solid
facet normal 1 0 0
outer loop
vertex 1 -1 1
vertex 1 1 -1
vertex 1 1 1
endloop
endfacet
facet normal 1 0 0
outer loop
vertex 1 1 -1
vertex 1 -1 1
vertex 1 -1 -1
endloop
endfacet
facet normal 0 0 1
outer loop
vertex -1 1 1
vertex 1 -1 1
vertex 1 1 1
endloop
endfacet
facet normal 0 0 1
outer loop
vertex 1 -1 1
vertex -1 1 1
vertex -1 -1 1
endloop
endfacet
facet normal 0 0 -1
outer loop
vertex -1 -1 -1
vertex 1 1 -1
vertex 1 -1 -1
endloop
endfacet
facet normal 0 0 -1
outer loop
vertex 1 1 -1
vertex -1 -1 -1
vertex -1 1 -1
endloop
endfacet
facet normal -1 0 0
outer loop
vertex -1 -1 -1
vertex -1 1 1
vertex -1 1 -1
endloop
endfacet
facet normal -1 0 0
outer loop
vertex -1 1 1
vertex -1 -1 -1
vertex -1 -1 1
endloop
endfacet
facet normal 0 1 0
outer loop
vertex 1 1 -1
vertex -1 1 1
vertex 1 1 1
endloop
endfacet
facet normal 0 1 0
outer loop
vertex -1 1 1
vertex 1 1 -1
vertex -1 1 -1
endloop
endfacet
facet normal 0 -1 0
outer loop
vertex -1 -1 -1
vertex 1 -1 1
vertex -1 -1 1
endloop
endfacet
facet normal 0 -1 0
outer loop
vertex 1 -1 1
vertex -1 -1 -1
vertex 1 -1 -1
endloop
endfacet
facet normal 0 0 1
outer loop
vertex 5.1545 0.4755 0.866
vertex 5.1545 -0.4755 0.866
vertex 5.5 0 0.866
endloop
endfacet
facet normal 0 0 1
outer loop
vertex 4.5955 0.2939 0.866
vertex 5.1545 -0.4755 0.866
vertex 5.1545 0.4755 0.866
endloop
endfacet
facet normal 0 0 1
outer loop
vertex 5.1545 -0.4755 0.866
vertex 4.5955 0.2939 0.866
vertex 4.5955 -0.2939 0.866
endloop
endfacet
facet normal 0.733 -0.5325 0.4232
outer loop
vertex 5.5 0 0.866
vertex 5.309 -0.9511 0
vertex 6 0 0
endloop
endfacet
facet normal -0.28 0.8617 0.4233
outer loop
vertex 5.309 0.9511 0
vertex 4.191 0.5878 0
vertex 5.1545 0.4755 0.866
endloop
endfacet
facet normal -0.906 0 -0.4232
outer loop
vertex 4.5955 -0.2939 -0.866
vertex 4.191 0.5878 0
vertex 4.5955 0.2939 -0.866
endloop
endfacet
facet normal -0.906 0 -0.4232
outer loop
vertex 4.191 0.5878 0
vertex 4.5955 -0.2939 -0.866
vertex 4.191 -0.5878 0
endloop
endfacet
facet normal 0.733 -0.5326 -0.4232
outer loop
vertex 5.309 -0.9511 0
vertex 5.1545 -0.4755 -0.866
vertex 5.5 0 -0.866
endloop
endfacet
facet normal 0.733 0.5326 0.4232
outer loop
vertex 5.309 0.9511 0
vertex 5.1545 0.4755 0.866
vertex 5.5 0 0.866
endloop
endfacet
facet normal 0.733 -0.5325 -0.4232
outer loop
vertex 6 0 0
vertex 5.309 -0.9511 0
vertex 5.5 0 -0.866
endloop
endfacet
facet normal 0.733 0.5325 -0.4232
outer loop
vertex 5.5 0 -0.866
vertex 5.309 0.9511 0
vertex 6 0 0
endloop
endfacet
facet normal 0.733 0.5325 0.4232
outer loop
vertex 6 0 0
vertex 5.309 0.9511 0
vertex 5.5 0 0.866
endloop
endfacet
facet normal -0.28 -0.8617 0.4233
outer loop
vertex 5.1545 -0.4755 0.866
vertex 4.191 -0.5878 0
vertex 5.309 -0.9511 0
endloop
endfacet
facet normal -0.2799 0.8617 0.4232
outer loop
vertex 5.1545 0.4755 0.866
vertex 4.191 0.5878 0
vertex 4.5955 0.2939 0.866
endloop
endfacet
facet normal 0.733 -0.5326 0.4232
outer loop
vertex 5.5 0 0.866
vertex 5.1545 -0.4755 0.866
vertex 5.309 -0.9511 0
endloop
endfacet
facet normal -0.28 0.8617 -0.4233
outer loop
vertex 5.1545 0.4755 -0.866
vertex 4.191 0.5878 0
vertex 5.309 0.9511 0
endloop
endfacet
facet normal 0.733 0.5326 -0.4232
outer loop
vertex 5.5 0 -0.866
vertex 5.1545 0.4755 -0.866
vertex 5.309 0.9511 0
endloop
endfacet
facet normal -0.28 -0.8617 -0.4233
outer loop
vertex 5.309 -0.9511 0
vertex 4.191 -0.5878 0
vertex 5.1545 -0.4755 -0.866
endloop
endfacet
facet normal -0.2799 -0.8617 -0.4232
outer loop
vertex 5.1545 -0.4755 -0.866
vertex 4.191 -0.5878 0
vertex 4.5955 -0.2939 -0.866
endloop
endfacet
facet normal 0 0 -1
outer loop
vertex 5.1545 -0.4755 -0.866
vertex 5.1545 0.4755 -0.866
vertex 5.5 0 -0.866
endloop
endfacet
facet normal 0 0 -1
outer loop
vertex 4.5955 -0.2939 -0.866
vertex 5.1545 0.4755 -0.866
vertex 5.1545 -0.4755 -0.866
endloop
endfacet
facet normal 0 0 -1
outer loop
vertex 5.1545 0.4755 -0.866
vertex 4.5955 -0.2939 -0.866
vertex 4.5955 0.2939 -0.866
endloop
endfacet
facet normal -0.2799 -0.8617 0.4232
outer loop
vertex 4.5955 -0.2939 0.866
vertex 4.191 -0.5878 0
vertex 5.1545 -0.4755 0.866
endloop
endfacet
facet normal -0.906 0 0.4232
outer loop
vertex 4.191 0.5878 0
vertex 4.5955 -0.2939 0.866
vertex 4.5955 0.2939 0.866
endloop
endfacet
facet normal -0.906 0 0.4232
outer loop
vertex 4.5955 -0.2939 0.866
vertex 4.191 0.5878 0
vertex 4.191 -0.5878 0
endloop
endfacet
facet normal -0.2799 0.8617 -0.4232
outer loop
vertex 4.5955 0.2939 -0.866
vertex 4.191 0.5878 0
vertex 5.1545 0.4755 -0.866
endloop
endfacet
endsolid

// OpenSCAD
// Unit of length: Unit.MM
union()
{
   cube(size = 2.0, center = true);
   translate(v = [5.0, 0.0, 0.0])
   {
      sphere(d = 2.0);
   }
}
